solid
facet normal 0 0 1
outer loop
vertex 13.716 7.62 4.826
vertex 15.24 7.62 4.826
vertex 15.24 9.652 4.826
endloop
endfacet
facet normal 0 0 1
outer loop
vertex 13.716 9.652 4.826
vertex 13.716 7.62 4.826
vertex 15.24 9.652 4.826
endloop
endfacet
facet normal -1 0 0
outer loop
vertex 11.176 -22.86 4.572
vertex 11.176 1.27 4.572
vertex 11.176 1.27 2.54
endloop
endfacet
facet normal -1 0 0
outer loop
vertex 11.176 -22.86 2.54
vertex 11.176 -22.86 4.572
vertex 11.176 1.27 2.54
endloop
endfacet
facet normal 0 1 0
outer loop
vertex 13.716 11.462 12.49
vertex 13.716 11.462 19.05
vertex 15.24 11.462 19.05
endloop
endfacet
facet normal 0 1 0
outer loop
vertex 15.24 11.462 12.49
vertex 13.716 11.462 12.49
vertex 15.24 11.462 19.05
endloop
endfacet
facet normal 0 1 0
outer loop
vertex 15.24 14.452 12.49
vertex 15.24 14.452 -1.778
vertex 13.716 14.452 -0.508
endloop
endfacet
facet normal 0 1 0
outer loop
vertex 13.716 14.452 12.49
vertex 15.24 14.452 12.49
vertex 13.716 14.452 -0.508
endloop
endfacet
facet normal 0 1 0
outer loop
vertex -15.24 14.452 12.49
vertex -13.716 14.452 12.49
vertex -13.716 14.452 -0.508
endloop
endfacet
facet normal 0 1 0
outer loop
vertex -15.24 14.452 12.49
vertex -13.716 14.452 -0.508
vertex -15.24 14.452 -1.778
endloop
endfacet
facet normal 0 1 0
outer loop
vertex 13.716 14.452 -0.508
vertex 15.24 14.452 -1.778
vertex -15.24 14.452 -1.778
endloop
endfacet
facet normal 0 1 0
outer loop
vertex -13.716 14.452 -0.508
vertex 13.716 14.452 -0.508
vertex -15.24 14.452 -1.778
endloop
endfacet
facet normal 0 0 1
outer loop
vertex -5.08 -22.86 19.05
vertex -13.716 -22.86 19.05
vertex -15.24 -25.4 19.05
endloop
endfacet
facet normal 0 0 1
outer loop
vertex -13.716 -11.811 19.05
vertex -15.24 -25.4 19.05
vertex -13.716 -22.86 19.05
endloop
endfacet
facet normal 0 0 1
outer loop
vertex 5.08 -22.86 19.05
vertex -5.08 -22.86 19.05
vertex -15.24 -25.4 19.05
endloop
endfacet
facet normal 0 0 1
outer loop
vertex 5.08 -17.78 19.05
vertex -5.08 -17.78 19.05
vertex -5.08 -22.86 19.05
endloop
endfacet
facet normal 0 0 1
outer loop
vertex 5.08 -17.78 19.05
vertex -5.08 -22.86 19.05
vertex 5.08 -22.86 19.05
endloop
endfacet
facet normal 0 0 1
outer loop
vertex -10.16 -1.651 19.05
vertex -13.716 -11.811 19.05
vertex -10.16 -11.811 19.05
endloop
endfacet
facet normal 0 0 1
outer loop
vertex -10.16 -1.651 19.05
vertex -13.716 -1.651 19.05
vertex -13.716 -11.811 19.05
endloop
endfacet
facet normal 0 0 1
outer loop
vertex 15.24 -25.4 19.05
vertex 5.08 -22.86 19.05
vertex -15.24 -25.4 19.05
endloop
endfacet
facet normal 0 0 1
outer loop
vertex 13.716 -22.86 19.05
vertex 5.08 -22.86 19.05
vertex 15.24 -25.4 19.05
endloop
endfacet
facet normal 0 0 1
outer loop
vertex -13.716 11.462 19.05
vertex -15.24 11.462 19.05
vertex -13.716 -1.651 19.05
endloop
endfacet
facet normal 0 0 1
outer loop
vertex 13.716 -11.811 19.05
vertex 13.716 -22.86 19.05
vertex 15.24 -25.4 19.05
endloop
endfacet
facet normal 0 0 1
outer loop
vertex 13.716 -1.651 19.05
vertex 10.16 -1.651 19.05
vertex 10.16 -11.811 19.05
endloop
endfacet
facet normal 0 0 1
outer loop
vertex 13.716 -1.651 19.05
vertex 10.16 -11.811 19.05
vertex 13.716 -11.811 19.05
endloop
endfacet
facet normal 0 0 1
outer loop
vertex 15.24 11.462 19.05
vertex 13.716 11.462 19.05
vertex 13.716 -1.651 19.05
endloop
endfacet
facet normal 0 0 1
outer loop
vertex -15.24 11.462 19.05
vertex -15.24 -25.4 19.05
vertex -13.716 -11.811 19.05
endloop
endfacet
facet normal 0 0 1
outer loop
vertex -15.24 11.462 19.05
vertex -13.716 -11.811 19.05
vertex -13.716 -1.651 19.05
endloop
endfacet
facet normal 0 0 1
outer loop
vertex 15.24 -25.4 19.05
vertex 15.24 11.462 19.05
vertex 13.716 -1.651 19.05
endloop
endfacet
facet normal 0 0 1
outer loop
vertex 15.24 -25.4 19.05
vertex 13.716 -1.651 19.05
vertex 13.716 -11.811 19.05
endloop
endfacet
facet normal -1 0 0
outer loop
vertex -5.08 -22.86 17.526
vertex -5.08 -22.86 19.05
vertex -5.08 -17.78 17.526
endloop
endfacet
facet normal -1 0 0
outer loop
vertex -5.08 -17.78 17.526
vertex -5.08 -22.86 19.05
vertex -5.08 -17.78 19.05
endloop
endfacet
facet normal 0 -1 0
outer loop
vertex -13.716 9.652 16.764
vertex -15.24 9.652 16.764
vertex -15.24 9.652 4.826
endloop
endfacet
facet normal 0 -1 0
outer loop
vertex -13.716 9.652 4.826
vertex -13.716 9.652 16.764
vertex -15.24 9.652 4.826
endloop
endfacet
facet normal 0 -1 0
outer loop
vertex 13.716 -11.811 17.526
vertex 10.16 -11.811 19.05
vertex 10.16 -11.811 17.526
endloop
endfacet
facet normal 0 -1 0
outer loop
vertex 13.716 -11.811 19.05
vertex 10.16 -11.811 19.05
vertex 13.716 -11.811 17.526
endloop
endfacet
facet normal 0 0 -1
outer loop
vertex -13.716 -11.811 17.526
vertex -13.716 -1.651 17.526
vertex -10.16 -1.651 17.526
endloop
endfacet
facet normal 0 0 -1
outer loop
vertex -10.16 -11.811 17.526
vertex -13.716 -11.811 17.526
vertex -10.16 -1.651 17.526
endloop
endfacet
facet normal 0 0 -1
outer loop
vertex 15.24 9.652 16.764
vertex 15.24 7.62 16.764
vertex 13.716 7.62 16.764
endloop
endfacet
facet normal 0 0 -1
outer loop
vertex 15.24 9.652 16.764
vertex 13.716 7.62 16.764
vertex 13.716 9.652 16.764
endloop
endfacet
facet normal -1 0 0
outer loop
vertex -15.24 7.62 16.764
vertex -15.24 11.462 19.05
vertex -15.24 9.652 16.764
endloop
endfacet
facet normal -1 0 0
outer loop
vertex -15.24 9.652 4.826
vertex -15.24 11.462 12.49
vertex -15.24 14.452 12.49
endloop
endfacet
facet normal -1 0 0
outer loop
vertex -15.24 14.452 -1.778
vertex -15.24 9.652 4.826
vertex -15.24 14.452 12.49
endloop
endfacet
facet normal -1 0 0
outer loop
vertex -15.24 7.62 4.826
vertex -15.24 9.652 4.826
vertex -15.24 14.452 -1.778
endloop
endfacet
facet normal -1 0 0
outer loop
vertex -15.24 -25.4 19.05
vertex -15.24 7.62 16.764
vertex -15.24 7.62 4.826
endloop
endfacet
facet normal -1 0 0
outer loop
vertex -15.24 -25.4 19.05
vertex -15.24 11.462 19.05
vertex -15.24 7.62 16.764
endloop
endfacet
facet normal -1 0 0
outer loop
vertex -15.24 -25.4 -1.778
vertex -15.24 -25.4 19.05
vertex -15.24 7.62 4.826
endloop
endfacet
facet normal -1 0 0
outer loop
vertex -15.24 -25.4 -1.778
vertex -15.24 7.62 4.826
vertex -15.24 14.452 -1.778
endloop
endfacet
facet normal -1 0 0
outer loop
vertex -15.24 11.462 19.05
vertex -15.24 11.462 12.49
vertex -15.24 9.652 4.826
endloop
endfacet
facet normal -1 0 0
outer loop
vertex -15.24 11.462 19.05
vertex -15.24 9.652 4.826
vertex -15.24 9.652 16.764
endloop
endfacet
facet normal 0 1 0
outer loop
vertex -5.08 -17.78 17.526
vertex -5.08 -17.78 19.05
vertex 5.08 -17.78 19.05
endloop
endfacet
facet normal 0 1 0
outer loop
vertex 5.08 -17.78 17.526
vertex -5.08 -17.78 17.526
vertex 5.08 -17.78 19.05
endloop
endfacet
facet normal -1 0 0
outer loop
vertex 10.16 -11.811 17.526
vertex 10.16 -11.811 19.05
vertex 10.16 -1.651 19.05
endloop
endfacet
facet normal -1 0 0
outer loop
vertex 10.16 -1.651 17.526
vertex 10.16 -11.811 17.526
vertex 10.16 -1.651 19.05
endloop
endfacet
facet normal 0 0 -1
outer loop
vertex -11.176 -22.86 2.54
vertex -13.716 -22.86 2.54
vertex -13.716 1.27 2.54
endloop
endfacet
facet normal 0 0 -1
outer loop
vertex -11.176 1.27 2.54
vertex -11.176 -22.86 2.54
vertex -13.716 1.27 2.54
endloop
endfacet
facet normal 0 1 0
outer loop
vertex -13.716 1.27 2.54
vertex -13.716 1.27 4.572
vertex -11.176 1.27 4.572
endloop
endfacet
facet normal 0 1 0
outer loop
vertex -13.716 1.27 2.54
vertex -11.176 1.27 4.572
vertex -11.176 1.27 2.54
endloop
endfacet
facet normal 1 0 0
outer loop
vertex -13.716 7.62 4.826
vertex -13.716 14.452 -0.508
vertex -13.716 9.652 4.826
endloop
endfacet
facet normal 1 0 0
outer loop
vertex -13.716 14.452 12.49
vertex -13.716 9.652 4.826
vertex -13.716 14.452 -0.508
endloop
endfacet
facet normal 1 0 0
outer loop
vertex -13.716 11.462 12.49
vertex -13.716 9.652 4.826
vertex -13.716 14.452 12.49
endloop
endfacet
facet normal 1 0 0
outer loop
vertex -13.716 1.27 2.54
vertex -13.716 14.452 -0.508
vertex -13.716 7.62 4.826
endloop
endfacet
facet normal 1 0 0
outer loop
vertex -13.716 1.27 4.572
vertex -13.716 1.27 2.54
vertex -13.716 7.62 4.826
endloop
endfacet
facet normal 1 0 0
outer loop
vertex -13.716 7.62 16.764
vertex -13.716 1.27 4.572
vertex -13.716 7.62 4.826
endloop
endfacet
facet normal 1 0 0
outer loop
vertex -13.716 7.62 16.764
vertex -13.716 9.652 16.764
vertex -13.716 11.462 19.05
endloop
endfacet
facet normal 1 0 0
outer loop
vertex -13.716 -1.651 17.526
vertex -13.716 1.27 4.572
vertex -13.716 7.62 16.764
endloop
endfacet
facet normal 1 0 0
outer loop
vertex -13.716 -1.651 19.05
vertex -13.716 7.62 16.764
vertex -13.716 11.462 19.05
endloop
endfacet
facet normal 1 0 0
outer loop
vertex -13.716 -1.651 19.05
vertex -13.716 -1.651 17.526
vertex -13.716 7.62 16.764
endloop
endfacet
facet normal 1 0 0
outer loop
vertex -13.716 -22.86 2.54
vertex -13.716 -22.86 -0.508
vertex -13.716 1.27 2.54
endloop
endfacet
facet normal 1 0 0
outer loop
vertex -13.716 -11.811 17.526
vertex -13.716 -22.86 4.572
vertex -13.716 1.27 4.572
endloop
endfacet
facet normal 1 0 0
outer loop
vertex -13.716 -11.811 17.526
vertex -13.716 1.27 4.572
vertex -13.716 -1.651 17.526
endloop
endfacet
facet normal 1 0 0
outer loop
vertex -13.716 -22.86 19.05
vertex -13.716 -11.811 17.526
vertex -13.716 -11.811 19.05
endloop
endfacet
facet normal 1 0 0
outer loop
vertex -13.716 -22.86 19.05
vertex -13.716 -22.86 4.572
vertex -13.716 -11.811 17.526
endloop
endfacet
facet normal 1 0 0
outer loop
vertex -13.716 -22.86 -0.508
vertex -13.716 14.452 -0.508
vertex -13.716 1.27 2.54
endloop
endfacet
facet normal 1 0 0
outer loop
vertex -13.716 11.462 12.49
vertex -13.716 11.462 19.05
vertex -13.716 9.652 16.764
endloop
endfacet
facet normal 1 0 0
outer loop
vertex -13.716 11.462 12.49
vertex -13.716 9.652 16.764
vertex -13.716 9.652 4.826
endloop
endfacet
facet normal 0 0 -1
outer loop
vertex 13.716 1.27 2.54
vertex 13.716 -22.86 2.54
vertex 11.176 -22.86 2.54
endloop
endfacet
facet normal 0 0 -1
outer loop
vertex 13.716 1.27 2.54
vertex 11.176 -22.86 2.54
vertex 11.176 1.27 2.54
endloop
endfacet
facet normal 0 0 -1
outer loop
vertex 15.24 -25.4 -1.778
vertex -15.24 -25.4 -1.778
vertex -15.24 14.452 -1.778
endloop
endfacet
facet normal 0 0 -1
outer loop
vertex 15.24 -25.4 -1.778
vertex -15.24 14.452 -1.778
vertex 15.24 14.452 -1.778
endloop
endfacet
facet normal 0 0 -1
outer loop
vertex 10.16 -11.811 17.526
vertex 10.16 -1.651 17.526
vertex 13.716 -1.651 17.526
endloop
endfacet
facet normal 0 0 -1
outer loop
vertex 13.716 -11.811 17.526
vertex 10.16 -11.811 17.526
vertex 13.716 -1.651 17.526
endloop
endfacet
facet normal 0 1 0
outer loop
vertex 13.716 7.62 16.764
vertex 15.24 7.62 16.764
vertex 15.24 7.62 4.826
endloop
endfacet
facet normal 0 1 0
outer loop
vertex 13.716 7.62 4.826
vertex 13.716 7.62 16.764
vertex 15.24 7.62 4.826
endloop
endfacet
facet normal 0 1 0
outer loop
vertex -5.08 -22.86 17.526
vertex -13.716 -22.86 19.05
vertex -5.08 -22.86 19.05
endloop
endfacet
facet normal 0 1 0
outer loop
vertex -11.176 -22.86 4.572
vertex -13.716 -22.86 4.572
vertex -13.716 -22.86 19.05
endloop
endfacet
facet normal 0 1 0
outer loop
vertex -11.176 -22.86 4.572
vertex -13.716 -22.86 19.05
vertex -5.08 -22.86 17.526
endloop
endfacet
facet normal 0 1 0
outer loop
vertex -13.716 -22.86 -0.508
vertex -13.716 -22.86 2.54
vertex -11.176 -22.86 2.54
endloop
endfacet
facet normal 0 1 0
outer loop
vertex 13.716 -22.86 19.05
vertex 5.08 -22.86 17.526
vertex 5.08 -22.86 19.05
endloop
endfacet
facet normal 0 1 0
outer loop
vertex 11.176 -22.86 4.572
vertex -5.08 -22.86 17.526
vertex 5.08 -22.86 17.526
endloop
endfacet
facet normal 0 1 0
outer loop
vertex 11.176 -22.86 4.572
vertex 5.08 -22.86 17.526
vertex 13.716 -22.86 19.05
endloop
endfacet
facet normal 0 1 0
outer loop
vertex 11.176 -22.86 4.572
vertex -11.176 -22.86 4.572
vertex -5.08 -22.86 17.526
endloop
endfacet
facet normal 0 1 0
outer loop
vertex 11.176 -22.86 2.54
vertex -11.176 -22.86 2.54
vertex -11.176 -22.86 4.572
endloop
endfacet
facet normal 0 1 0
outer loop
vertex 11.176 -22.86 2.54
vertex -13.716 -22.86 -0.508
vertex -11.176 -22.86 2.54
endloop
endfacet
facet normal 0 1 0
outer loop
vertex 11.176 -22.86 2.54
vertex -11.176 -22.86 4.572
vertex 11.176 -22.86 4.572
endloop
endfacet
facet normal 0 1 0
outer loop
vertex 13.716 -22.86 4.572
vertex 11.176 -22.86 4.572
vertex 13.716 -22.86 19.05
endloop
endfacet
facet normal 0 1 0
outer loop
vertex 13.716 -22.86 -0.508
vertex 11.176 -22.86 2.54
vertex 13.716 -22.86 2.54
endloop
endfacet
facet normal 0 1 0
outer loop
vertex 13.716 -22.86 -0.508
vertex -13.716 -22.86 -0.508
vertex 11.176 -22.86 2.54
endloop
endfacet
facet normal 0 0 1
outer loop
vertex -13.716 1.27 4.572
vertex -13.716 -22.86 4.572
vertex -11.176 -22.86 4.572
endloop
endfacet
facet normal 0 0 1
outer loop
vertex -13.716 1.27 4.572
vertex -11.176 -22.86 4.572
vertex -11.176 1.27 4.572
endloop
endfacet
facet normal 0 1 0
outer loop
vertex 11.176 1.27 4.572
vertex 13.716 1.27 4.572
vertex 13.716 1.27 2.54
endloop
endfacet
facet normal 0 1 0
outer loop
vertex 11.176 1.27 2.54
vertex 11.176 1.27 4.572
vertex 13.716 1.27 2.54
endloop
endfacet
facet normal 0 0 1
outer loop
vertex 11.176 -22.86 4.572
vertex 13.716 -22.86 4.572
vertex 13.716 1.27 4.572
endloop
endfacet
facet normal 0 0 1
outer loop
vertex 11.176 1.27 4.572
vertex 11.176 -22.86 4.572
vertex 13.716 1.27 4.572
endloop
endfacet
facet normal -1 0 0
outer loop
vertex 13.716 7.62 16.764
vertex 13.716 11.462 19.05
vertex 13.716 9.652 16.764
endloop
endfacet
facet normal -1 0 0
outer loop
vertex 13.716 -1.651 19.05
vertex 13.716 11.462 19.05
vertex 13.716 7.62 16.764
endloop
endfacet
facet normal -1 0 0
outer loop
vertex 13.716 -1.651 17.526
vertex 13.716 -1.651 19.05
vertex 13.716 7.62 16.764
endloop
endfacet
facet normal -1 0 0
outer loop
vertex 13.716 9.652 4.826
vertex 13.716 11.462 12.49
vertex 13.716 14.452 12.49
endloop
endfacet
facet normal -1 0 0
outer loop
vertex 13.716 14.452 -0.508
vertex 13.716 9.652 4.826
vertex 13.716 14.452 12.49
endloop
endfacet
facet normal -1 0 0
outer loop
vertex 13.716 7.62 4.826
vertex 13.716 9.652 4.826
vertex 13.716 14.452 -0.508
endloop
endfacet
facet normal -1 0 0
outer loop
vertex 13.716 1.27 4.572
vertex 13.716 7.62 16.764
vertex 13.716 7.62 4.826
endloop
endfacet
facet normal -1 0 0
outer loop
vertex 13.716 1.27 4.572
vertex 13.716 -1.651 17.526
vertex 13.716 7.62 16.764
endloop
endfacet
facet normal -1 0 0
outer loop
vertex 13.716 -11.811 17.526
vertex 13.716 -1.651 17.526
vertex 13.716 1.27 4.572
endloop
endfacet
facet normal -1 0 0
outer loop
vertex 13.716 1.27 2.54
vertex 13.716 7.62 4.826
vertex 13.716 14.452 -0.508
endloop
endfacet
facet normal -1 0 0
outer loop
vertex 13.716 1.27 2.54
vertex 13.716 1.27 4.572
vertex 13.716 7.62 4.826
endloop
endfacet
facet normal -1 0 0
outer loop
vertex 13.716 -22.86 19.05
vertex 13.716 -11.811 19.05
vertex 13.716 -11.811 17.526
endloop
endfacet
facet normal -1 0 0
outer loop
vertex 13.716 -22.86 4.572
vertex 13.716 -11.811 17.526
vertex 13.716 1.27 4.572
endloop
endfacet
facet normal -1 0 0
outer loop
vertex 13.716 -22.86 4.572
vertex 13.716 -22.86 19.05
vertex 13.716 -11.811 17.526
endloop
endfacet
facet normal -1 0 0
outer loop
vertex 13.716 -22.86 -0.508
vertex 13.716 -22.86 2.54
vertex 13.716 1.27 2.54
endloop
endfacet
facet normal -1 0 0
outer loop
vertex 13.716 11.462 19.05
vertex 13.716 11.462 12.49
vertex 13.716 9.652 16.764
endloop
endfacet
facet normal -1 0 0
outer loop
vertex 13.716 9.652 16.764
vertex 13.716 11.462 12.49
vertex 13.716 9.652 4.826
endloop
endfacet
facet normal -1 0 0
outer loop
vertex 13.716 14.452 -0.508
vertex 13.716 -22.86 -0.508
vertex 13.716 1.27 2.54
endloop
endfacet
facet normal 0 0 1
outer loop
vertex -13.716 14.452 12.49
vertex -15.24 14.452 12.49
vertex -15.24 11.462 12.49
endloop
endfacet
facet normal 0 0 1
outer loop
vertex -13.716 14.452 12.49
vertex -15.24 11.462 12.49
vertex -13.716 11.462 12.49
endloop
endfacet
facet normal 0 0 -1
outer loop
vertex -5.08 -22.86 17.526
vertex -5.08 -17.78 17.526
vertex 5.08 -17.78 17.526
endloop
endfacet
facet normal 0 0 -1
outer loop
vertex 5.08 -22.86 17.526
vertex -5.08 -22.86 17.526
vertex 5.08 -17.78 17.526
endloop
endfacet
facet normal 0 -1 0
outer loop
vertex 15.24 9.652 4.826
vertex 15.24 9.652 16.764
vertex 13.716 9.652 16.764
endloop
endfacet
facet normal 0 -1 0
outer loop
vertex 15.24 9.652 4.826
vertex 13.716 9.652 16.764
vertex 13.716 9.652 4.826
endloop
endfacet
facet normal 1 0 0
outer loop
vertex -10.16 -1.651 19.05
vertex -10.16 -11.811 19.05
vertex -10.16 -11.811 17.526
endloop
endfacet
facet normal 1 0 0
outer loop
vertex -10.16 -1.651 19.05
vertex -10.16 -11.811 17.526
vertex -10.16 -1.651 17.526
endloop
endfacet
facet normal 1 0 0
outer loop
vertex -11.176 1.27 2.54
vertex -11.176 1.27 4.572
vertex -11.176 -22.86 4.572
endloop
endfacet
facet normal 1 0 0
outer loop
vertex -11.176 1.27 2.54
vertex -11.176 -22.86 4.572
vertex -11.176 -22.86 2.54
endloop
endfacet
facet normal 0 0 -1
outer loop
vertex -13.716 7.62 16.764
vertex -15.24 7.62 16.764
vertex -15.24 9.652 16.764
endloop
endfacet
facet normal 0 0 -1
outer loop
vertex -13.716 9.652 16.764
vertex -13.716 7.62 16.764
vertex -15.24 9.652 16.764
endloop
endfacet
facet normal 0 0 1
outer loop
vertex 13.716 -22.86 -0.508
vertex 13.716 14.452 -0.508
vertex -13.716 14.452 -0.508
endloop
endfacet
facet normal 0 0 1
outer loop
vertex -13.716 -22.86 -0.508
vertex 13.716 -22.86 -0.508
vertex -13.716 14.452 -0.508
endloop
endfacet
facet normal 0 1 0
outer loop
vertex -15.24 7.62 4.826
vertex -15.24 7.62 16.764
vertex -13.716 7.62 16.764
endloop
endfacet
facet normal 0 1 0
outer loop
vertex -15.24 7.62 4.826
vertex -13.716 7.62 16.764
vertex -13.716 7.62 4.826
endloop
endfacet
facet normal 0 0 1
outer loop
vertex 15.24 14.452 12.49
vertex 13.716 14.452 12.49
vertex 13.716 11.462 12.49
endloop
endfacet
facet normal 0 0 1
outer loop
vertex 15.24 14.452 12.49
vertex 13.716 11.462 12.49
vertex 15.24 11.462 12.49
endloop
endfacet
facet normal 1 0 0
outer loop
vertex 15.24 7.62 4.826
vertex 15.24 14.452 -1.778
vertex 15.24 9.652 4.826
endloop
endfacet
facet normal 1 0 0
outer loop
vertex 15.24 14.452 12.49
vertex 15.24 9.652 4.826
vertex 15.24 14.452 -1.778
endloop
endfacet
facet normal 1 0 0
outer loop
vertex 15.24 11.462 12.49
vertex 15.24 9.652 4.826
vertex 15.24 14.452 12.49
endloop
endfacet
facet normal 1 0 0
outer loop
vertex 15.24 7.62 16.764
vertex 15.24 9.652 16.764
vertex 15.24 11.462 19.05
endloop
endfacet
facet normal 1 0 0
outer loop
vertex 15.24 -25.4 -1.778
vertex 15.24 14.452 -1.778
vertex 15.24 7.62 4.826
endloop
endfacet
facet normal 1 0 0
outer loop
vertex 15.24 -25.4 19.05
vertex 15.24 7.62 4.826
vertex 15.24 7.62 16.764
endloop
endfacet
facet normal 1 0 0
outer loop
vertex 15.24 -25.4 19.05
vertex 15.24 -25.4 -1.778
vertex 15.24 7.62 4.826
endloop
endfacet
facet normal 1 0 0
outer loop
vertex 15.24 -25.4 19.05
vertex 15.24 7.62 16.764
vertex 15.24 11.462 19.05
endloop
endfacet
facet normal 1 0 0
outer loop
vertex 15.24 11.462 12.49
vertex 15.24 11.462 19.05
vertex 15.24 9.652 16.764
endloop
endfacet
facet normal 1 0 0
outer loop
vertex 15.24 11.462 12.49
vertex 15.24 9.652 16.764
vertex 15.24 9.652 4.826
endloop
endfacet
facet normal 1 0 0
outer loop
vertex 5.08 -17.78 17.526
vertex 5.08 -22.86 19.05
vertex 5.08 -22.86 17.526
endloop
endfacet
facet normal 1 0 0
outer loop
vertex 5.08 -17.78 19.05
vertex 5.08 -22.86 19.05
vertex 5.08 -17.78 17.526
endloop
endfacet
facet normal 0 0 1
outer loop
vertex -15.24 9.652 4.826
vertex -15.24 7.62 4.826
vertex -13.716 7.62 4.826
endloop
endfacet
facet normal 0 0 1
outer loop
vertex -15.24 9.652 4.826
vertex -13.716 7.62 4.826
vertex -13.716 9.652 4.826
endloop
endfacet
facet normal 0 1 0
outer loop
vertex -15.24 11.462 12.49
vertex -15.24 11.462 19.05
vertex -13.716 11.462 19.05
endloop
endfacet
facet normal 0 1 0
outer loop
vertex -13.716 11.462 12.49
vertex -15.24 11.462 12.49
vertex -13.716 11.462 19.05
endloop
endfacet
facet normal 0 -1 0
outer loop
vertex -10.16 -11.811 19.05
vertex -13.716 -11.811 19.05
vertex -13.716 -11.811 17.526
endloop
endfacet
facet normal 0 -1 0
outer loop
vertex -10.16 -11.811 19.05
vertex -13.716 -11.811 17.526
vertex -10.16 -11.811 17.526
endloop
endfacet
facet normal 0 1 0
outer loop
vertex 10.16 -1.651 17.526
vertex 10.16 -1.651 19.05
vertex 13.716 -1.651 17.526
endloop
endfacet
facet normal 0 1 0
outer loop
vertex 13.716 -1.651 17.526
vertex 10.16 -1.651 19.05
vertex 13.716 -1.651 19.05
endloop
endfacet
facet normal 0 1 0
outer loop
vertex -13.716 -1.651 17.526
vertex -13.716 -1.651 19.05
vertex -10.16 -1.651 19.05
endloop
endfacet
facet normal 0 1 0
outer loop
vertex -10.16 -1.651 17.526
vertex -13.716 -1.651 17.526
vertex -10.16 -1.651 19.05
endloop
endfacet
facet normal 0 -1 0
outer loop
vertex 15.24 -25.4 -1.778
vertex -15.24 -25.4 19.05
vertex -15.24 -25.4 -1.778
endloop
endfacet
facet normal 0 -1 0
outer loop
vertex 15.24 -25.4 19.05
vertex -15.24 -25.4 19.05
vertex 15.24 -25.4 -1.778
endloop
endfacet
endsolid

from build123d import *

# Parameters (mm, degrees)
SKETCH1_W                = 30.48
SKETCH1_H                = 40.64
INITIAL_BLOCK_DEPTH      = 19.05
INITIAL_BLOCK_DEPTH_BACK = 1.778
SKETCH2_W                = 27.432
SKETCH2_H                = 19.558
INITIAL_CUT_DEPTH        = 38.1
SKETCH20_W               = 5.08
SKETCH20_H               = 10.16
SKETCH20_W_2             = 10.16
SKETCH20_H_2             = 5.08
BOSS_EXTRUDE1_DEPTH      = 1.524
SKETCH21_W               = 2.032
SKETCH21_H               = 24.13
BOSS_EXTRUDE2_DEPTH      = 2.54
SKETCH27_W               = 11.938
SKETCH27_H               = 2.032
CUT_EXTRUDE6_DEPTH       = 1.524
SKETCH28_W               = 30.48
SKETCH28_H               = 1.778
CUT_EXTRUDE7_DEPTH       = 21.828
SKETCH29_W               = 30.48
SKETCH29_H               = 2
CUT_EXTRUDE8_DEPTH       = 5.81
BOSS_EXTRUDE3_DEPTH      = 0.99
SKETCH31_W               = 30.48
SKETCH31_H               = 2.99
CUT_EXTRUDE9_DEPTH       = 0.75


with BuildPart() as part:
    # Sketch1 → Initial Block (new body, two sides)
    with BuildSketch(Plane.XY) as initial_block_sk:
        with Locations((0, -5.08)):
            Rectangle(SKETCH1_W, SKETCH1_H)
    extrude(amount=INITIAL_BLOCK_DEPTH)
    extrude(initial_block_sk.sketch, amount=-INITIAL_BLOCK_DEPTH_BACK)

    # Sketch2 → Initial Cut (cut)
    with BuildSketch(Plane(origin=(0, 15.24, 0), x_dir=(1, 0, 0), z_dir=(0, 1, 0))):
        with Locations((0, -9.271)):
            Rectangle(SKETCH2_W, SKETCH2_H)
    extrude(amount=-INITIAL_CUT_DEPTH, mode=Mode.SUBTRACT)

    # Sketch20 → Boss-Extrude1 (add)
    with BuildSketch(Plane.XY.offset(19.05)):
        with Locations((-12.7, -6.731)):
            Rectangle(SKETCH20_W, SKETCH20_H)
        with Locations((12.7, -6.731)):
            Rectangle(SKETCH20_W, SKETCH20_H)
        with Locations((0, -20.32)):
            Rectangle(SKETCH20_W_2, SKETCH20_H_2)
    extrude(amount=-BOSS_EXTRUDE1_DEPTH)

    # Sketch21 → Boss-Extrude2 (add)
    with BuildSketch(Plane(origin=(-13.716, 0, 0), x_dir=(0, 0, -1), z_dir=(1, 0, 0))):
        with Locations((-3.556, -10.795)):
            Rectangle(SKETCH21_W, SKETCH21_H)
    boss_extrude2 = extrude(amount=BOSS_EXTRUDE2_DEPTH)

    # Mirror2: Boss-Extrude2 across plane
    add(boss_extrude2.mirror(Plane(origin=(0, 0, 0), x_dir=(0, 0, 1), z_dir=(1, 0, 0))))

    # Sketch27 → Cut-Extrude6 (cut)
    with BuildSketch(Plane(origin=(15.24, 0, 0), x_dir=(0, 0, -1), z_dir=(1, 0, 0))):
        with Locations((-10.795, 8.636)):
            Rectangle(SKETCH27_W, SKETCH27_H)
    cut_extrude6 = extrude(amount=-CUT_EXTRUDE6_DEPTH, mode=Mode.SUBTRACT)

    # Mirror6: Cut-Extrude6 across plane
    add(cut_extrude6.mirror(Plane(origin=(0, 0, 0), x_dir=(0, 0, 1), z_dir=(1, 0, 0))), mode=Mode.SUBTRACT)

    # Sketch28 → Cut-Extrude7 (cut, through all)
    with BuildSketch(Plane.XY.offset(19.05)):
        with Locations((0, 14.351)):
            Rectangle(SKETCH28_W, SKETCH28_H)
    extrude(amount=-CUT_EXTRUDE7_DEPTH, mode=Mode.SUBTRACT)

    # Sketch29 → Cut-Extrude8 (cut)
    with BuildSketch(Plane.XY.offset(19.05)):
        with Locations((0, 12.462)):
            Rectangle(SKETCH29_W, SKETCH29_H)
    extrude(amount=-CUT_EXTRUDE8_DEPTH, mode=Mode.SUBTRACT)

    # Sketch30 → Boss-Extrude3 (add)
    with BuildSketch(Plane(origin=(0, 13.462, 0), x_dir=(1, 0, 0), z_dir=(0, 1, 0))):
        Polygon((-15.24, -13.24), (-15.24, 1.778), (15.24, 1.778), (15.24, -13.24), (13.716, -13.24), (13.716, 0.508), (-13.716, 0.508), (-13.716, -13.24), align=None)
    extrude(amount=BOSS_EXTRUDE3_DEPTH)

    # Sketch31 → Cut-Extrude9 (cut)
    with BuildSketch(Plane.XY.offset(13.24)):
        with Locations((0, 12.957)):
            Rectangle(SKETCH31_W, SKETCH31_H)
    extrude(amount=-CUT_EXTRUDE9_DEPTH, mode=Mode.SUBTRACT)


solid = part.part
